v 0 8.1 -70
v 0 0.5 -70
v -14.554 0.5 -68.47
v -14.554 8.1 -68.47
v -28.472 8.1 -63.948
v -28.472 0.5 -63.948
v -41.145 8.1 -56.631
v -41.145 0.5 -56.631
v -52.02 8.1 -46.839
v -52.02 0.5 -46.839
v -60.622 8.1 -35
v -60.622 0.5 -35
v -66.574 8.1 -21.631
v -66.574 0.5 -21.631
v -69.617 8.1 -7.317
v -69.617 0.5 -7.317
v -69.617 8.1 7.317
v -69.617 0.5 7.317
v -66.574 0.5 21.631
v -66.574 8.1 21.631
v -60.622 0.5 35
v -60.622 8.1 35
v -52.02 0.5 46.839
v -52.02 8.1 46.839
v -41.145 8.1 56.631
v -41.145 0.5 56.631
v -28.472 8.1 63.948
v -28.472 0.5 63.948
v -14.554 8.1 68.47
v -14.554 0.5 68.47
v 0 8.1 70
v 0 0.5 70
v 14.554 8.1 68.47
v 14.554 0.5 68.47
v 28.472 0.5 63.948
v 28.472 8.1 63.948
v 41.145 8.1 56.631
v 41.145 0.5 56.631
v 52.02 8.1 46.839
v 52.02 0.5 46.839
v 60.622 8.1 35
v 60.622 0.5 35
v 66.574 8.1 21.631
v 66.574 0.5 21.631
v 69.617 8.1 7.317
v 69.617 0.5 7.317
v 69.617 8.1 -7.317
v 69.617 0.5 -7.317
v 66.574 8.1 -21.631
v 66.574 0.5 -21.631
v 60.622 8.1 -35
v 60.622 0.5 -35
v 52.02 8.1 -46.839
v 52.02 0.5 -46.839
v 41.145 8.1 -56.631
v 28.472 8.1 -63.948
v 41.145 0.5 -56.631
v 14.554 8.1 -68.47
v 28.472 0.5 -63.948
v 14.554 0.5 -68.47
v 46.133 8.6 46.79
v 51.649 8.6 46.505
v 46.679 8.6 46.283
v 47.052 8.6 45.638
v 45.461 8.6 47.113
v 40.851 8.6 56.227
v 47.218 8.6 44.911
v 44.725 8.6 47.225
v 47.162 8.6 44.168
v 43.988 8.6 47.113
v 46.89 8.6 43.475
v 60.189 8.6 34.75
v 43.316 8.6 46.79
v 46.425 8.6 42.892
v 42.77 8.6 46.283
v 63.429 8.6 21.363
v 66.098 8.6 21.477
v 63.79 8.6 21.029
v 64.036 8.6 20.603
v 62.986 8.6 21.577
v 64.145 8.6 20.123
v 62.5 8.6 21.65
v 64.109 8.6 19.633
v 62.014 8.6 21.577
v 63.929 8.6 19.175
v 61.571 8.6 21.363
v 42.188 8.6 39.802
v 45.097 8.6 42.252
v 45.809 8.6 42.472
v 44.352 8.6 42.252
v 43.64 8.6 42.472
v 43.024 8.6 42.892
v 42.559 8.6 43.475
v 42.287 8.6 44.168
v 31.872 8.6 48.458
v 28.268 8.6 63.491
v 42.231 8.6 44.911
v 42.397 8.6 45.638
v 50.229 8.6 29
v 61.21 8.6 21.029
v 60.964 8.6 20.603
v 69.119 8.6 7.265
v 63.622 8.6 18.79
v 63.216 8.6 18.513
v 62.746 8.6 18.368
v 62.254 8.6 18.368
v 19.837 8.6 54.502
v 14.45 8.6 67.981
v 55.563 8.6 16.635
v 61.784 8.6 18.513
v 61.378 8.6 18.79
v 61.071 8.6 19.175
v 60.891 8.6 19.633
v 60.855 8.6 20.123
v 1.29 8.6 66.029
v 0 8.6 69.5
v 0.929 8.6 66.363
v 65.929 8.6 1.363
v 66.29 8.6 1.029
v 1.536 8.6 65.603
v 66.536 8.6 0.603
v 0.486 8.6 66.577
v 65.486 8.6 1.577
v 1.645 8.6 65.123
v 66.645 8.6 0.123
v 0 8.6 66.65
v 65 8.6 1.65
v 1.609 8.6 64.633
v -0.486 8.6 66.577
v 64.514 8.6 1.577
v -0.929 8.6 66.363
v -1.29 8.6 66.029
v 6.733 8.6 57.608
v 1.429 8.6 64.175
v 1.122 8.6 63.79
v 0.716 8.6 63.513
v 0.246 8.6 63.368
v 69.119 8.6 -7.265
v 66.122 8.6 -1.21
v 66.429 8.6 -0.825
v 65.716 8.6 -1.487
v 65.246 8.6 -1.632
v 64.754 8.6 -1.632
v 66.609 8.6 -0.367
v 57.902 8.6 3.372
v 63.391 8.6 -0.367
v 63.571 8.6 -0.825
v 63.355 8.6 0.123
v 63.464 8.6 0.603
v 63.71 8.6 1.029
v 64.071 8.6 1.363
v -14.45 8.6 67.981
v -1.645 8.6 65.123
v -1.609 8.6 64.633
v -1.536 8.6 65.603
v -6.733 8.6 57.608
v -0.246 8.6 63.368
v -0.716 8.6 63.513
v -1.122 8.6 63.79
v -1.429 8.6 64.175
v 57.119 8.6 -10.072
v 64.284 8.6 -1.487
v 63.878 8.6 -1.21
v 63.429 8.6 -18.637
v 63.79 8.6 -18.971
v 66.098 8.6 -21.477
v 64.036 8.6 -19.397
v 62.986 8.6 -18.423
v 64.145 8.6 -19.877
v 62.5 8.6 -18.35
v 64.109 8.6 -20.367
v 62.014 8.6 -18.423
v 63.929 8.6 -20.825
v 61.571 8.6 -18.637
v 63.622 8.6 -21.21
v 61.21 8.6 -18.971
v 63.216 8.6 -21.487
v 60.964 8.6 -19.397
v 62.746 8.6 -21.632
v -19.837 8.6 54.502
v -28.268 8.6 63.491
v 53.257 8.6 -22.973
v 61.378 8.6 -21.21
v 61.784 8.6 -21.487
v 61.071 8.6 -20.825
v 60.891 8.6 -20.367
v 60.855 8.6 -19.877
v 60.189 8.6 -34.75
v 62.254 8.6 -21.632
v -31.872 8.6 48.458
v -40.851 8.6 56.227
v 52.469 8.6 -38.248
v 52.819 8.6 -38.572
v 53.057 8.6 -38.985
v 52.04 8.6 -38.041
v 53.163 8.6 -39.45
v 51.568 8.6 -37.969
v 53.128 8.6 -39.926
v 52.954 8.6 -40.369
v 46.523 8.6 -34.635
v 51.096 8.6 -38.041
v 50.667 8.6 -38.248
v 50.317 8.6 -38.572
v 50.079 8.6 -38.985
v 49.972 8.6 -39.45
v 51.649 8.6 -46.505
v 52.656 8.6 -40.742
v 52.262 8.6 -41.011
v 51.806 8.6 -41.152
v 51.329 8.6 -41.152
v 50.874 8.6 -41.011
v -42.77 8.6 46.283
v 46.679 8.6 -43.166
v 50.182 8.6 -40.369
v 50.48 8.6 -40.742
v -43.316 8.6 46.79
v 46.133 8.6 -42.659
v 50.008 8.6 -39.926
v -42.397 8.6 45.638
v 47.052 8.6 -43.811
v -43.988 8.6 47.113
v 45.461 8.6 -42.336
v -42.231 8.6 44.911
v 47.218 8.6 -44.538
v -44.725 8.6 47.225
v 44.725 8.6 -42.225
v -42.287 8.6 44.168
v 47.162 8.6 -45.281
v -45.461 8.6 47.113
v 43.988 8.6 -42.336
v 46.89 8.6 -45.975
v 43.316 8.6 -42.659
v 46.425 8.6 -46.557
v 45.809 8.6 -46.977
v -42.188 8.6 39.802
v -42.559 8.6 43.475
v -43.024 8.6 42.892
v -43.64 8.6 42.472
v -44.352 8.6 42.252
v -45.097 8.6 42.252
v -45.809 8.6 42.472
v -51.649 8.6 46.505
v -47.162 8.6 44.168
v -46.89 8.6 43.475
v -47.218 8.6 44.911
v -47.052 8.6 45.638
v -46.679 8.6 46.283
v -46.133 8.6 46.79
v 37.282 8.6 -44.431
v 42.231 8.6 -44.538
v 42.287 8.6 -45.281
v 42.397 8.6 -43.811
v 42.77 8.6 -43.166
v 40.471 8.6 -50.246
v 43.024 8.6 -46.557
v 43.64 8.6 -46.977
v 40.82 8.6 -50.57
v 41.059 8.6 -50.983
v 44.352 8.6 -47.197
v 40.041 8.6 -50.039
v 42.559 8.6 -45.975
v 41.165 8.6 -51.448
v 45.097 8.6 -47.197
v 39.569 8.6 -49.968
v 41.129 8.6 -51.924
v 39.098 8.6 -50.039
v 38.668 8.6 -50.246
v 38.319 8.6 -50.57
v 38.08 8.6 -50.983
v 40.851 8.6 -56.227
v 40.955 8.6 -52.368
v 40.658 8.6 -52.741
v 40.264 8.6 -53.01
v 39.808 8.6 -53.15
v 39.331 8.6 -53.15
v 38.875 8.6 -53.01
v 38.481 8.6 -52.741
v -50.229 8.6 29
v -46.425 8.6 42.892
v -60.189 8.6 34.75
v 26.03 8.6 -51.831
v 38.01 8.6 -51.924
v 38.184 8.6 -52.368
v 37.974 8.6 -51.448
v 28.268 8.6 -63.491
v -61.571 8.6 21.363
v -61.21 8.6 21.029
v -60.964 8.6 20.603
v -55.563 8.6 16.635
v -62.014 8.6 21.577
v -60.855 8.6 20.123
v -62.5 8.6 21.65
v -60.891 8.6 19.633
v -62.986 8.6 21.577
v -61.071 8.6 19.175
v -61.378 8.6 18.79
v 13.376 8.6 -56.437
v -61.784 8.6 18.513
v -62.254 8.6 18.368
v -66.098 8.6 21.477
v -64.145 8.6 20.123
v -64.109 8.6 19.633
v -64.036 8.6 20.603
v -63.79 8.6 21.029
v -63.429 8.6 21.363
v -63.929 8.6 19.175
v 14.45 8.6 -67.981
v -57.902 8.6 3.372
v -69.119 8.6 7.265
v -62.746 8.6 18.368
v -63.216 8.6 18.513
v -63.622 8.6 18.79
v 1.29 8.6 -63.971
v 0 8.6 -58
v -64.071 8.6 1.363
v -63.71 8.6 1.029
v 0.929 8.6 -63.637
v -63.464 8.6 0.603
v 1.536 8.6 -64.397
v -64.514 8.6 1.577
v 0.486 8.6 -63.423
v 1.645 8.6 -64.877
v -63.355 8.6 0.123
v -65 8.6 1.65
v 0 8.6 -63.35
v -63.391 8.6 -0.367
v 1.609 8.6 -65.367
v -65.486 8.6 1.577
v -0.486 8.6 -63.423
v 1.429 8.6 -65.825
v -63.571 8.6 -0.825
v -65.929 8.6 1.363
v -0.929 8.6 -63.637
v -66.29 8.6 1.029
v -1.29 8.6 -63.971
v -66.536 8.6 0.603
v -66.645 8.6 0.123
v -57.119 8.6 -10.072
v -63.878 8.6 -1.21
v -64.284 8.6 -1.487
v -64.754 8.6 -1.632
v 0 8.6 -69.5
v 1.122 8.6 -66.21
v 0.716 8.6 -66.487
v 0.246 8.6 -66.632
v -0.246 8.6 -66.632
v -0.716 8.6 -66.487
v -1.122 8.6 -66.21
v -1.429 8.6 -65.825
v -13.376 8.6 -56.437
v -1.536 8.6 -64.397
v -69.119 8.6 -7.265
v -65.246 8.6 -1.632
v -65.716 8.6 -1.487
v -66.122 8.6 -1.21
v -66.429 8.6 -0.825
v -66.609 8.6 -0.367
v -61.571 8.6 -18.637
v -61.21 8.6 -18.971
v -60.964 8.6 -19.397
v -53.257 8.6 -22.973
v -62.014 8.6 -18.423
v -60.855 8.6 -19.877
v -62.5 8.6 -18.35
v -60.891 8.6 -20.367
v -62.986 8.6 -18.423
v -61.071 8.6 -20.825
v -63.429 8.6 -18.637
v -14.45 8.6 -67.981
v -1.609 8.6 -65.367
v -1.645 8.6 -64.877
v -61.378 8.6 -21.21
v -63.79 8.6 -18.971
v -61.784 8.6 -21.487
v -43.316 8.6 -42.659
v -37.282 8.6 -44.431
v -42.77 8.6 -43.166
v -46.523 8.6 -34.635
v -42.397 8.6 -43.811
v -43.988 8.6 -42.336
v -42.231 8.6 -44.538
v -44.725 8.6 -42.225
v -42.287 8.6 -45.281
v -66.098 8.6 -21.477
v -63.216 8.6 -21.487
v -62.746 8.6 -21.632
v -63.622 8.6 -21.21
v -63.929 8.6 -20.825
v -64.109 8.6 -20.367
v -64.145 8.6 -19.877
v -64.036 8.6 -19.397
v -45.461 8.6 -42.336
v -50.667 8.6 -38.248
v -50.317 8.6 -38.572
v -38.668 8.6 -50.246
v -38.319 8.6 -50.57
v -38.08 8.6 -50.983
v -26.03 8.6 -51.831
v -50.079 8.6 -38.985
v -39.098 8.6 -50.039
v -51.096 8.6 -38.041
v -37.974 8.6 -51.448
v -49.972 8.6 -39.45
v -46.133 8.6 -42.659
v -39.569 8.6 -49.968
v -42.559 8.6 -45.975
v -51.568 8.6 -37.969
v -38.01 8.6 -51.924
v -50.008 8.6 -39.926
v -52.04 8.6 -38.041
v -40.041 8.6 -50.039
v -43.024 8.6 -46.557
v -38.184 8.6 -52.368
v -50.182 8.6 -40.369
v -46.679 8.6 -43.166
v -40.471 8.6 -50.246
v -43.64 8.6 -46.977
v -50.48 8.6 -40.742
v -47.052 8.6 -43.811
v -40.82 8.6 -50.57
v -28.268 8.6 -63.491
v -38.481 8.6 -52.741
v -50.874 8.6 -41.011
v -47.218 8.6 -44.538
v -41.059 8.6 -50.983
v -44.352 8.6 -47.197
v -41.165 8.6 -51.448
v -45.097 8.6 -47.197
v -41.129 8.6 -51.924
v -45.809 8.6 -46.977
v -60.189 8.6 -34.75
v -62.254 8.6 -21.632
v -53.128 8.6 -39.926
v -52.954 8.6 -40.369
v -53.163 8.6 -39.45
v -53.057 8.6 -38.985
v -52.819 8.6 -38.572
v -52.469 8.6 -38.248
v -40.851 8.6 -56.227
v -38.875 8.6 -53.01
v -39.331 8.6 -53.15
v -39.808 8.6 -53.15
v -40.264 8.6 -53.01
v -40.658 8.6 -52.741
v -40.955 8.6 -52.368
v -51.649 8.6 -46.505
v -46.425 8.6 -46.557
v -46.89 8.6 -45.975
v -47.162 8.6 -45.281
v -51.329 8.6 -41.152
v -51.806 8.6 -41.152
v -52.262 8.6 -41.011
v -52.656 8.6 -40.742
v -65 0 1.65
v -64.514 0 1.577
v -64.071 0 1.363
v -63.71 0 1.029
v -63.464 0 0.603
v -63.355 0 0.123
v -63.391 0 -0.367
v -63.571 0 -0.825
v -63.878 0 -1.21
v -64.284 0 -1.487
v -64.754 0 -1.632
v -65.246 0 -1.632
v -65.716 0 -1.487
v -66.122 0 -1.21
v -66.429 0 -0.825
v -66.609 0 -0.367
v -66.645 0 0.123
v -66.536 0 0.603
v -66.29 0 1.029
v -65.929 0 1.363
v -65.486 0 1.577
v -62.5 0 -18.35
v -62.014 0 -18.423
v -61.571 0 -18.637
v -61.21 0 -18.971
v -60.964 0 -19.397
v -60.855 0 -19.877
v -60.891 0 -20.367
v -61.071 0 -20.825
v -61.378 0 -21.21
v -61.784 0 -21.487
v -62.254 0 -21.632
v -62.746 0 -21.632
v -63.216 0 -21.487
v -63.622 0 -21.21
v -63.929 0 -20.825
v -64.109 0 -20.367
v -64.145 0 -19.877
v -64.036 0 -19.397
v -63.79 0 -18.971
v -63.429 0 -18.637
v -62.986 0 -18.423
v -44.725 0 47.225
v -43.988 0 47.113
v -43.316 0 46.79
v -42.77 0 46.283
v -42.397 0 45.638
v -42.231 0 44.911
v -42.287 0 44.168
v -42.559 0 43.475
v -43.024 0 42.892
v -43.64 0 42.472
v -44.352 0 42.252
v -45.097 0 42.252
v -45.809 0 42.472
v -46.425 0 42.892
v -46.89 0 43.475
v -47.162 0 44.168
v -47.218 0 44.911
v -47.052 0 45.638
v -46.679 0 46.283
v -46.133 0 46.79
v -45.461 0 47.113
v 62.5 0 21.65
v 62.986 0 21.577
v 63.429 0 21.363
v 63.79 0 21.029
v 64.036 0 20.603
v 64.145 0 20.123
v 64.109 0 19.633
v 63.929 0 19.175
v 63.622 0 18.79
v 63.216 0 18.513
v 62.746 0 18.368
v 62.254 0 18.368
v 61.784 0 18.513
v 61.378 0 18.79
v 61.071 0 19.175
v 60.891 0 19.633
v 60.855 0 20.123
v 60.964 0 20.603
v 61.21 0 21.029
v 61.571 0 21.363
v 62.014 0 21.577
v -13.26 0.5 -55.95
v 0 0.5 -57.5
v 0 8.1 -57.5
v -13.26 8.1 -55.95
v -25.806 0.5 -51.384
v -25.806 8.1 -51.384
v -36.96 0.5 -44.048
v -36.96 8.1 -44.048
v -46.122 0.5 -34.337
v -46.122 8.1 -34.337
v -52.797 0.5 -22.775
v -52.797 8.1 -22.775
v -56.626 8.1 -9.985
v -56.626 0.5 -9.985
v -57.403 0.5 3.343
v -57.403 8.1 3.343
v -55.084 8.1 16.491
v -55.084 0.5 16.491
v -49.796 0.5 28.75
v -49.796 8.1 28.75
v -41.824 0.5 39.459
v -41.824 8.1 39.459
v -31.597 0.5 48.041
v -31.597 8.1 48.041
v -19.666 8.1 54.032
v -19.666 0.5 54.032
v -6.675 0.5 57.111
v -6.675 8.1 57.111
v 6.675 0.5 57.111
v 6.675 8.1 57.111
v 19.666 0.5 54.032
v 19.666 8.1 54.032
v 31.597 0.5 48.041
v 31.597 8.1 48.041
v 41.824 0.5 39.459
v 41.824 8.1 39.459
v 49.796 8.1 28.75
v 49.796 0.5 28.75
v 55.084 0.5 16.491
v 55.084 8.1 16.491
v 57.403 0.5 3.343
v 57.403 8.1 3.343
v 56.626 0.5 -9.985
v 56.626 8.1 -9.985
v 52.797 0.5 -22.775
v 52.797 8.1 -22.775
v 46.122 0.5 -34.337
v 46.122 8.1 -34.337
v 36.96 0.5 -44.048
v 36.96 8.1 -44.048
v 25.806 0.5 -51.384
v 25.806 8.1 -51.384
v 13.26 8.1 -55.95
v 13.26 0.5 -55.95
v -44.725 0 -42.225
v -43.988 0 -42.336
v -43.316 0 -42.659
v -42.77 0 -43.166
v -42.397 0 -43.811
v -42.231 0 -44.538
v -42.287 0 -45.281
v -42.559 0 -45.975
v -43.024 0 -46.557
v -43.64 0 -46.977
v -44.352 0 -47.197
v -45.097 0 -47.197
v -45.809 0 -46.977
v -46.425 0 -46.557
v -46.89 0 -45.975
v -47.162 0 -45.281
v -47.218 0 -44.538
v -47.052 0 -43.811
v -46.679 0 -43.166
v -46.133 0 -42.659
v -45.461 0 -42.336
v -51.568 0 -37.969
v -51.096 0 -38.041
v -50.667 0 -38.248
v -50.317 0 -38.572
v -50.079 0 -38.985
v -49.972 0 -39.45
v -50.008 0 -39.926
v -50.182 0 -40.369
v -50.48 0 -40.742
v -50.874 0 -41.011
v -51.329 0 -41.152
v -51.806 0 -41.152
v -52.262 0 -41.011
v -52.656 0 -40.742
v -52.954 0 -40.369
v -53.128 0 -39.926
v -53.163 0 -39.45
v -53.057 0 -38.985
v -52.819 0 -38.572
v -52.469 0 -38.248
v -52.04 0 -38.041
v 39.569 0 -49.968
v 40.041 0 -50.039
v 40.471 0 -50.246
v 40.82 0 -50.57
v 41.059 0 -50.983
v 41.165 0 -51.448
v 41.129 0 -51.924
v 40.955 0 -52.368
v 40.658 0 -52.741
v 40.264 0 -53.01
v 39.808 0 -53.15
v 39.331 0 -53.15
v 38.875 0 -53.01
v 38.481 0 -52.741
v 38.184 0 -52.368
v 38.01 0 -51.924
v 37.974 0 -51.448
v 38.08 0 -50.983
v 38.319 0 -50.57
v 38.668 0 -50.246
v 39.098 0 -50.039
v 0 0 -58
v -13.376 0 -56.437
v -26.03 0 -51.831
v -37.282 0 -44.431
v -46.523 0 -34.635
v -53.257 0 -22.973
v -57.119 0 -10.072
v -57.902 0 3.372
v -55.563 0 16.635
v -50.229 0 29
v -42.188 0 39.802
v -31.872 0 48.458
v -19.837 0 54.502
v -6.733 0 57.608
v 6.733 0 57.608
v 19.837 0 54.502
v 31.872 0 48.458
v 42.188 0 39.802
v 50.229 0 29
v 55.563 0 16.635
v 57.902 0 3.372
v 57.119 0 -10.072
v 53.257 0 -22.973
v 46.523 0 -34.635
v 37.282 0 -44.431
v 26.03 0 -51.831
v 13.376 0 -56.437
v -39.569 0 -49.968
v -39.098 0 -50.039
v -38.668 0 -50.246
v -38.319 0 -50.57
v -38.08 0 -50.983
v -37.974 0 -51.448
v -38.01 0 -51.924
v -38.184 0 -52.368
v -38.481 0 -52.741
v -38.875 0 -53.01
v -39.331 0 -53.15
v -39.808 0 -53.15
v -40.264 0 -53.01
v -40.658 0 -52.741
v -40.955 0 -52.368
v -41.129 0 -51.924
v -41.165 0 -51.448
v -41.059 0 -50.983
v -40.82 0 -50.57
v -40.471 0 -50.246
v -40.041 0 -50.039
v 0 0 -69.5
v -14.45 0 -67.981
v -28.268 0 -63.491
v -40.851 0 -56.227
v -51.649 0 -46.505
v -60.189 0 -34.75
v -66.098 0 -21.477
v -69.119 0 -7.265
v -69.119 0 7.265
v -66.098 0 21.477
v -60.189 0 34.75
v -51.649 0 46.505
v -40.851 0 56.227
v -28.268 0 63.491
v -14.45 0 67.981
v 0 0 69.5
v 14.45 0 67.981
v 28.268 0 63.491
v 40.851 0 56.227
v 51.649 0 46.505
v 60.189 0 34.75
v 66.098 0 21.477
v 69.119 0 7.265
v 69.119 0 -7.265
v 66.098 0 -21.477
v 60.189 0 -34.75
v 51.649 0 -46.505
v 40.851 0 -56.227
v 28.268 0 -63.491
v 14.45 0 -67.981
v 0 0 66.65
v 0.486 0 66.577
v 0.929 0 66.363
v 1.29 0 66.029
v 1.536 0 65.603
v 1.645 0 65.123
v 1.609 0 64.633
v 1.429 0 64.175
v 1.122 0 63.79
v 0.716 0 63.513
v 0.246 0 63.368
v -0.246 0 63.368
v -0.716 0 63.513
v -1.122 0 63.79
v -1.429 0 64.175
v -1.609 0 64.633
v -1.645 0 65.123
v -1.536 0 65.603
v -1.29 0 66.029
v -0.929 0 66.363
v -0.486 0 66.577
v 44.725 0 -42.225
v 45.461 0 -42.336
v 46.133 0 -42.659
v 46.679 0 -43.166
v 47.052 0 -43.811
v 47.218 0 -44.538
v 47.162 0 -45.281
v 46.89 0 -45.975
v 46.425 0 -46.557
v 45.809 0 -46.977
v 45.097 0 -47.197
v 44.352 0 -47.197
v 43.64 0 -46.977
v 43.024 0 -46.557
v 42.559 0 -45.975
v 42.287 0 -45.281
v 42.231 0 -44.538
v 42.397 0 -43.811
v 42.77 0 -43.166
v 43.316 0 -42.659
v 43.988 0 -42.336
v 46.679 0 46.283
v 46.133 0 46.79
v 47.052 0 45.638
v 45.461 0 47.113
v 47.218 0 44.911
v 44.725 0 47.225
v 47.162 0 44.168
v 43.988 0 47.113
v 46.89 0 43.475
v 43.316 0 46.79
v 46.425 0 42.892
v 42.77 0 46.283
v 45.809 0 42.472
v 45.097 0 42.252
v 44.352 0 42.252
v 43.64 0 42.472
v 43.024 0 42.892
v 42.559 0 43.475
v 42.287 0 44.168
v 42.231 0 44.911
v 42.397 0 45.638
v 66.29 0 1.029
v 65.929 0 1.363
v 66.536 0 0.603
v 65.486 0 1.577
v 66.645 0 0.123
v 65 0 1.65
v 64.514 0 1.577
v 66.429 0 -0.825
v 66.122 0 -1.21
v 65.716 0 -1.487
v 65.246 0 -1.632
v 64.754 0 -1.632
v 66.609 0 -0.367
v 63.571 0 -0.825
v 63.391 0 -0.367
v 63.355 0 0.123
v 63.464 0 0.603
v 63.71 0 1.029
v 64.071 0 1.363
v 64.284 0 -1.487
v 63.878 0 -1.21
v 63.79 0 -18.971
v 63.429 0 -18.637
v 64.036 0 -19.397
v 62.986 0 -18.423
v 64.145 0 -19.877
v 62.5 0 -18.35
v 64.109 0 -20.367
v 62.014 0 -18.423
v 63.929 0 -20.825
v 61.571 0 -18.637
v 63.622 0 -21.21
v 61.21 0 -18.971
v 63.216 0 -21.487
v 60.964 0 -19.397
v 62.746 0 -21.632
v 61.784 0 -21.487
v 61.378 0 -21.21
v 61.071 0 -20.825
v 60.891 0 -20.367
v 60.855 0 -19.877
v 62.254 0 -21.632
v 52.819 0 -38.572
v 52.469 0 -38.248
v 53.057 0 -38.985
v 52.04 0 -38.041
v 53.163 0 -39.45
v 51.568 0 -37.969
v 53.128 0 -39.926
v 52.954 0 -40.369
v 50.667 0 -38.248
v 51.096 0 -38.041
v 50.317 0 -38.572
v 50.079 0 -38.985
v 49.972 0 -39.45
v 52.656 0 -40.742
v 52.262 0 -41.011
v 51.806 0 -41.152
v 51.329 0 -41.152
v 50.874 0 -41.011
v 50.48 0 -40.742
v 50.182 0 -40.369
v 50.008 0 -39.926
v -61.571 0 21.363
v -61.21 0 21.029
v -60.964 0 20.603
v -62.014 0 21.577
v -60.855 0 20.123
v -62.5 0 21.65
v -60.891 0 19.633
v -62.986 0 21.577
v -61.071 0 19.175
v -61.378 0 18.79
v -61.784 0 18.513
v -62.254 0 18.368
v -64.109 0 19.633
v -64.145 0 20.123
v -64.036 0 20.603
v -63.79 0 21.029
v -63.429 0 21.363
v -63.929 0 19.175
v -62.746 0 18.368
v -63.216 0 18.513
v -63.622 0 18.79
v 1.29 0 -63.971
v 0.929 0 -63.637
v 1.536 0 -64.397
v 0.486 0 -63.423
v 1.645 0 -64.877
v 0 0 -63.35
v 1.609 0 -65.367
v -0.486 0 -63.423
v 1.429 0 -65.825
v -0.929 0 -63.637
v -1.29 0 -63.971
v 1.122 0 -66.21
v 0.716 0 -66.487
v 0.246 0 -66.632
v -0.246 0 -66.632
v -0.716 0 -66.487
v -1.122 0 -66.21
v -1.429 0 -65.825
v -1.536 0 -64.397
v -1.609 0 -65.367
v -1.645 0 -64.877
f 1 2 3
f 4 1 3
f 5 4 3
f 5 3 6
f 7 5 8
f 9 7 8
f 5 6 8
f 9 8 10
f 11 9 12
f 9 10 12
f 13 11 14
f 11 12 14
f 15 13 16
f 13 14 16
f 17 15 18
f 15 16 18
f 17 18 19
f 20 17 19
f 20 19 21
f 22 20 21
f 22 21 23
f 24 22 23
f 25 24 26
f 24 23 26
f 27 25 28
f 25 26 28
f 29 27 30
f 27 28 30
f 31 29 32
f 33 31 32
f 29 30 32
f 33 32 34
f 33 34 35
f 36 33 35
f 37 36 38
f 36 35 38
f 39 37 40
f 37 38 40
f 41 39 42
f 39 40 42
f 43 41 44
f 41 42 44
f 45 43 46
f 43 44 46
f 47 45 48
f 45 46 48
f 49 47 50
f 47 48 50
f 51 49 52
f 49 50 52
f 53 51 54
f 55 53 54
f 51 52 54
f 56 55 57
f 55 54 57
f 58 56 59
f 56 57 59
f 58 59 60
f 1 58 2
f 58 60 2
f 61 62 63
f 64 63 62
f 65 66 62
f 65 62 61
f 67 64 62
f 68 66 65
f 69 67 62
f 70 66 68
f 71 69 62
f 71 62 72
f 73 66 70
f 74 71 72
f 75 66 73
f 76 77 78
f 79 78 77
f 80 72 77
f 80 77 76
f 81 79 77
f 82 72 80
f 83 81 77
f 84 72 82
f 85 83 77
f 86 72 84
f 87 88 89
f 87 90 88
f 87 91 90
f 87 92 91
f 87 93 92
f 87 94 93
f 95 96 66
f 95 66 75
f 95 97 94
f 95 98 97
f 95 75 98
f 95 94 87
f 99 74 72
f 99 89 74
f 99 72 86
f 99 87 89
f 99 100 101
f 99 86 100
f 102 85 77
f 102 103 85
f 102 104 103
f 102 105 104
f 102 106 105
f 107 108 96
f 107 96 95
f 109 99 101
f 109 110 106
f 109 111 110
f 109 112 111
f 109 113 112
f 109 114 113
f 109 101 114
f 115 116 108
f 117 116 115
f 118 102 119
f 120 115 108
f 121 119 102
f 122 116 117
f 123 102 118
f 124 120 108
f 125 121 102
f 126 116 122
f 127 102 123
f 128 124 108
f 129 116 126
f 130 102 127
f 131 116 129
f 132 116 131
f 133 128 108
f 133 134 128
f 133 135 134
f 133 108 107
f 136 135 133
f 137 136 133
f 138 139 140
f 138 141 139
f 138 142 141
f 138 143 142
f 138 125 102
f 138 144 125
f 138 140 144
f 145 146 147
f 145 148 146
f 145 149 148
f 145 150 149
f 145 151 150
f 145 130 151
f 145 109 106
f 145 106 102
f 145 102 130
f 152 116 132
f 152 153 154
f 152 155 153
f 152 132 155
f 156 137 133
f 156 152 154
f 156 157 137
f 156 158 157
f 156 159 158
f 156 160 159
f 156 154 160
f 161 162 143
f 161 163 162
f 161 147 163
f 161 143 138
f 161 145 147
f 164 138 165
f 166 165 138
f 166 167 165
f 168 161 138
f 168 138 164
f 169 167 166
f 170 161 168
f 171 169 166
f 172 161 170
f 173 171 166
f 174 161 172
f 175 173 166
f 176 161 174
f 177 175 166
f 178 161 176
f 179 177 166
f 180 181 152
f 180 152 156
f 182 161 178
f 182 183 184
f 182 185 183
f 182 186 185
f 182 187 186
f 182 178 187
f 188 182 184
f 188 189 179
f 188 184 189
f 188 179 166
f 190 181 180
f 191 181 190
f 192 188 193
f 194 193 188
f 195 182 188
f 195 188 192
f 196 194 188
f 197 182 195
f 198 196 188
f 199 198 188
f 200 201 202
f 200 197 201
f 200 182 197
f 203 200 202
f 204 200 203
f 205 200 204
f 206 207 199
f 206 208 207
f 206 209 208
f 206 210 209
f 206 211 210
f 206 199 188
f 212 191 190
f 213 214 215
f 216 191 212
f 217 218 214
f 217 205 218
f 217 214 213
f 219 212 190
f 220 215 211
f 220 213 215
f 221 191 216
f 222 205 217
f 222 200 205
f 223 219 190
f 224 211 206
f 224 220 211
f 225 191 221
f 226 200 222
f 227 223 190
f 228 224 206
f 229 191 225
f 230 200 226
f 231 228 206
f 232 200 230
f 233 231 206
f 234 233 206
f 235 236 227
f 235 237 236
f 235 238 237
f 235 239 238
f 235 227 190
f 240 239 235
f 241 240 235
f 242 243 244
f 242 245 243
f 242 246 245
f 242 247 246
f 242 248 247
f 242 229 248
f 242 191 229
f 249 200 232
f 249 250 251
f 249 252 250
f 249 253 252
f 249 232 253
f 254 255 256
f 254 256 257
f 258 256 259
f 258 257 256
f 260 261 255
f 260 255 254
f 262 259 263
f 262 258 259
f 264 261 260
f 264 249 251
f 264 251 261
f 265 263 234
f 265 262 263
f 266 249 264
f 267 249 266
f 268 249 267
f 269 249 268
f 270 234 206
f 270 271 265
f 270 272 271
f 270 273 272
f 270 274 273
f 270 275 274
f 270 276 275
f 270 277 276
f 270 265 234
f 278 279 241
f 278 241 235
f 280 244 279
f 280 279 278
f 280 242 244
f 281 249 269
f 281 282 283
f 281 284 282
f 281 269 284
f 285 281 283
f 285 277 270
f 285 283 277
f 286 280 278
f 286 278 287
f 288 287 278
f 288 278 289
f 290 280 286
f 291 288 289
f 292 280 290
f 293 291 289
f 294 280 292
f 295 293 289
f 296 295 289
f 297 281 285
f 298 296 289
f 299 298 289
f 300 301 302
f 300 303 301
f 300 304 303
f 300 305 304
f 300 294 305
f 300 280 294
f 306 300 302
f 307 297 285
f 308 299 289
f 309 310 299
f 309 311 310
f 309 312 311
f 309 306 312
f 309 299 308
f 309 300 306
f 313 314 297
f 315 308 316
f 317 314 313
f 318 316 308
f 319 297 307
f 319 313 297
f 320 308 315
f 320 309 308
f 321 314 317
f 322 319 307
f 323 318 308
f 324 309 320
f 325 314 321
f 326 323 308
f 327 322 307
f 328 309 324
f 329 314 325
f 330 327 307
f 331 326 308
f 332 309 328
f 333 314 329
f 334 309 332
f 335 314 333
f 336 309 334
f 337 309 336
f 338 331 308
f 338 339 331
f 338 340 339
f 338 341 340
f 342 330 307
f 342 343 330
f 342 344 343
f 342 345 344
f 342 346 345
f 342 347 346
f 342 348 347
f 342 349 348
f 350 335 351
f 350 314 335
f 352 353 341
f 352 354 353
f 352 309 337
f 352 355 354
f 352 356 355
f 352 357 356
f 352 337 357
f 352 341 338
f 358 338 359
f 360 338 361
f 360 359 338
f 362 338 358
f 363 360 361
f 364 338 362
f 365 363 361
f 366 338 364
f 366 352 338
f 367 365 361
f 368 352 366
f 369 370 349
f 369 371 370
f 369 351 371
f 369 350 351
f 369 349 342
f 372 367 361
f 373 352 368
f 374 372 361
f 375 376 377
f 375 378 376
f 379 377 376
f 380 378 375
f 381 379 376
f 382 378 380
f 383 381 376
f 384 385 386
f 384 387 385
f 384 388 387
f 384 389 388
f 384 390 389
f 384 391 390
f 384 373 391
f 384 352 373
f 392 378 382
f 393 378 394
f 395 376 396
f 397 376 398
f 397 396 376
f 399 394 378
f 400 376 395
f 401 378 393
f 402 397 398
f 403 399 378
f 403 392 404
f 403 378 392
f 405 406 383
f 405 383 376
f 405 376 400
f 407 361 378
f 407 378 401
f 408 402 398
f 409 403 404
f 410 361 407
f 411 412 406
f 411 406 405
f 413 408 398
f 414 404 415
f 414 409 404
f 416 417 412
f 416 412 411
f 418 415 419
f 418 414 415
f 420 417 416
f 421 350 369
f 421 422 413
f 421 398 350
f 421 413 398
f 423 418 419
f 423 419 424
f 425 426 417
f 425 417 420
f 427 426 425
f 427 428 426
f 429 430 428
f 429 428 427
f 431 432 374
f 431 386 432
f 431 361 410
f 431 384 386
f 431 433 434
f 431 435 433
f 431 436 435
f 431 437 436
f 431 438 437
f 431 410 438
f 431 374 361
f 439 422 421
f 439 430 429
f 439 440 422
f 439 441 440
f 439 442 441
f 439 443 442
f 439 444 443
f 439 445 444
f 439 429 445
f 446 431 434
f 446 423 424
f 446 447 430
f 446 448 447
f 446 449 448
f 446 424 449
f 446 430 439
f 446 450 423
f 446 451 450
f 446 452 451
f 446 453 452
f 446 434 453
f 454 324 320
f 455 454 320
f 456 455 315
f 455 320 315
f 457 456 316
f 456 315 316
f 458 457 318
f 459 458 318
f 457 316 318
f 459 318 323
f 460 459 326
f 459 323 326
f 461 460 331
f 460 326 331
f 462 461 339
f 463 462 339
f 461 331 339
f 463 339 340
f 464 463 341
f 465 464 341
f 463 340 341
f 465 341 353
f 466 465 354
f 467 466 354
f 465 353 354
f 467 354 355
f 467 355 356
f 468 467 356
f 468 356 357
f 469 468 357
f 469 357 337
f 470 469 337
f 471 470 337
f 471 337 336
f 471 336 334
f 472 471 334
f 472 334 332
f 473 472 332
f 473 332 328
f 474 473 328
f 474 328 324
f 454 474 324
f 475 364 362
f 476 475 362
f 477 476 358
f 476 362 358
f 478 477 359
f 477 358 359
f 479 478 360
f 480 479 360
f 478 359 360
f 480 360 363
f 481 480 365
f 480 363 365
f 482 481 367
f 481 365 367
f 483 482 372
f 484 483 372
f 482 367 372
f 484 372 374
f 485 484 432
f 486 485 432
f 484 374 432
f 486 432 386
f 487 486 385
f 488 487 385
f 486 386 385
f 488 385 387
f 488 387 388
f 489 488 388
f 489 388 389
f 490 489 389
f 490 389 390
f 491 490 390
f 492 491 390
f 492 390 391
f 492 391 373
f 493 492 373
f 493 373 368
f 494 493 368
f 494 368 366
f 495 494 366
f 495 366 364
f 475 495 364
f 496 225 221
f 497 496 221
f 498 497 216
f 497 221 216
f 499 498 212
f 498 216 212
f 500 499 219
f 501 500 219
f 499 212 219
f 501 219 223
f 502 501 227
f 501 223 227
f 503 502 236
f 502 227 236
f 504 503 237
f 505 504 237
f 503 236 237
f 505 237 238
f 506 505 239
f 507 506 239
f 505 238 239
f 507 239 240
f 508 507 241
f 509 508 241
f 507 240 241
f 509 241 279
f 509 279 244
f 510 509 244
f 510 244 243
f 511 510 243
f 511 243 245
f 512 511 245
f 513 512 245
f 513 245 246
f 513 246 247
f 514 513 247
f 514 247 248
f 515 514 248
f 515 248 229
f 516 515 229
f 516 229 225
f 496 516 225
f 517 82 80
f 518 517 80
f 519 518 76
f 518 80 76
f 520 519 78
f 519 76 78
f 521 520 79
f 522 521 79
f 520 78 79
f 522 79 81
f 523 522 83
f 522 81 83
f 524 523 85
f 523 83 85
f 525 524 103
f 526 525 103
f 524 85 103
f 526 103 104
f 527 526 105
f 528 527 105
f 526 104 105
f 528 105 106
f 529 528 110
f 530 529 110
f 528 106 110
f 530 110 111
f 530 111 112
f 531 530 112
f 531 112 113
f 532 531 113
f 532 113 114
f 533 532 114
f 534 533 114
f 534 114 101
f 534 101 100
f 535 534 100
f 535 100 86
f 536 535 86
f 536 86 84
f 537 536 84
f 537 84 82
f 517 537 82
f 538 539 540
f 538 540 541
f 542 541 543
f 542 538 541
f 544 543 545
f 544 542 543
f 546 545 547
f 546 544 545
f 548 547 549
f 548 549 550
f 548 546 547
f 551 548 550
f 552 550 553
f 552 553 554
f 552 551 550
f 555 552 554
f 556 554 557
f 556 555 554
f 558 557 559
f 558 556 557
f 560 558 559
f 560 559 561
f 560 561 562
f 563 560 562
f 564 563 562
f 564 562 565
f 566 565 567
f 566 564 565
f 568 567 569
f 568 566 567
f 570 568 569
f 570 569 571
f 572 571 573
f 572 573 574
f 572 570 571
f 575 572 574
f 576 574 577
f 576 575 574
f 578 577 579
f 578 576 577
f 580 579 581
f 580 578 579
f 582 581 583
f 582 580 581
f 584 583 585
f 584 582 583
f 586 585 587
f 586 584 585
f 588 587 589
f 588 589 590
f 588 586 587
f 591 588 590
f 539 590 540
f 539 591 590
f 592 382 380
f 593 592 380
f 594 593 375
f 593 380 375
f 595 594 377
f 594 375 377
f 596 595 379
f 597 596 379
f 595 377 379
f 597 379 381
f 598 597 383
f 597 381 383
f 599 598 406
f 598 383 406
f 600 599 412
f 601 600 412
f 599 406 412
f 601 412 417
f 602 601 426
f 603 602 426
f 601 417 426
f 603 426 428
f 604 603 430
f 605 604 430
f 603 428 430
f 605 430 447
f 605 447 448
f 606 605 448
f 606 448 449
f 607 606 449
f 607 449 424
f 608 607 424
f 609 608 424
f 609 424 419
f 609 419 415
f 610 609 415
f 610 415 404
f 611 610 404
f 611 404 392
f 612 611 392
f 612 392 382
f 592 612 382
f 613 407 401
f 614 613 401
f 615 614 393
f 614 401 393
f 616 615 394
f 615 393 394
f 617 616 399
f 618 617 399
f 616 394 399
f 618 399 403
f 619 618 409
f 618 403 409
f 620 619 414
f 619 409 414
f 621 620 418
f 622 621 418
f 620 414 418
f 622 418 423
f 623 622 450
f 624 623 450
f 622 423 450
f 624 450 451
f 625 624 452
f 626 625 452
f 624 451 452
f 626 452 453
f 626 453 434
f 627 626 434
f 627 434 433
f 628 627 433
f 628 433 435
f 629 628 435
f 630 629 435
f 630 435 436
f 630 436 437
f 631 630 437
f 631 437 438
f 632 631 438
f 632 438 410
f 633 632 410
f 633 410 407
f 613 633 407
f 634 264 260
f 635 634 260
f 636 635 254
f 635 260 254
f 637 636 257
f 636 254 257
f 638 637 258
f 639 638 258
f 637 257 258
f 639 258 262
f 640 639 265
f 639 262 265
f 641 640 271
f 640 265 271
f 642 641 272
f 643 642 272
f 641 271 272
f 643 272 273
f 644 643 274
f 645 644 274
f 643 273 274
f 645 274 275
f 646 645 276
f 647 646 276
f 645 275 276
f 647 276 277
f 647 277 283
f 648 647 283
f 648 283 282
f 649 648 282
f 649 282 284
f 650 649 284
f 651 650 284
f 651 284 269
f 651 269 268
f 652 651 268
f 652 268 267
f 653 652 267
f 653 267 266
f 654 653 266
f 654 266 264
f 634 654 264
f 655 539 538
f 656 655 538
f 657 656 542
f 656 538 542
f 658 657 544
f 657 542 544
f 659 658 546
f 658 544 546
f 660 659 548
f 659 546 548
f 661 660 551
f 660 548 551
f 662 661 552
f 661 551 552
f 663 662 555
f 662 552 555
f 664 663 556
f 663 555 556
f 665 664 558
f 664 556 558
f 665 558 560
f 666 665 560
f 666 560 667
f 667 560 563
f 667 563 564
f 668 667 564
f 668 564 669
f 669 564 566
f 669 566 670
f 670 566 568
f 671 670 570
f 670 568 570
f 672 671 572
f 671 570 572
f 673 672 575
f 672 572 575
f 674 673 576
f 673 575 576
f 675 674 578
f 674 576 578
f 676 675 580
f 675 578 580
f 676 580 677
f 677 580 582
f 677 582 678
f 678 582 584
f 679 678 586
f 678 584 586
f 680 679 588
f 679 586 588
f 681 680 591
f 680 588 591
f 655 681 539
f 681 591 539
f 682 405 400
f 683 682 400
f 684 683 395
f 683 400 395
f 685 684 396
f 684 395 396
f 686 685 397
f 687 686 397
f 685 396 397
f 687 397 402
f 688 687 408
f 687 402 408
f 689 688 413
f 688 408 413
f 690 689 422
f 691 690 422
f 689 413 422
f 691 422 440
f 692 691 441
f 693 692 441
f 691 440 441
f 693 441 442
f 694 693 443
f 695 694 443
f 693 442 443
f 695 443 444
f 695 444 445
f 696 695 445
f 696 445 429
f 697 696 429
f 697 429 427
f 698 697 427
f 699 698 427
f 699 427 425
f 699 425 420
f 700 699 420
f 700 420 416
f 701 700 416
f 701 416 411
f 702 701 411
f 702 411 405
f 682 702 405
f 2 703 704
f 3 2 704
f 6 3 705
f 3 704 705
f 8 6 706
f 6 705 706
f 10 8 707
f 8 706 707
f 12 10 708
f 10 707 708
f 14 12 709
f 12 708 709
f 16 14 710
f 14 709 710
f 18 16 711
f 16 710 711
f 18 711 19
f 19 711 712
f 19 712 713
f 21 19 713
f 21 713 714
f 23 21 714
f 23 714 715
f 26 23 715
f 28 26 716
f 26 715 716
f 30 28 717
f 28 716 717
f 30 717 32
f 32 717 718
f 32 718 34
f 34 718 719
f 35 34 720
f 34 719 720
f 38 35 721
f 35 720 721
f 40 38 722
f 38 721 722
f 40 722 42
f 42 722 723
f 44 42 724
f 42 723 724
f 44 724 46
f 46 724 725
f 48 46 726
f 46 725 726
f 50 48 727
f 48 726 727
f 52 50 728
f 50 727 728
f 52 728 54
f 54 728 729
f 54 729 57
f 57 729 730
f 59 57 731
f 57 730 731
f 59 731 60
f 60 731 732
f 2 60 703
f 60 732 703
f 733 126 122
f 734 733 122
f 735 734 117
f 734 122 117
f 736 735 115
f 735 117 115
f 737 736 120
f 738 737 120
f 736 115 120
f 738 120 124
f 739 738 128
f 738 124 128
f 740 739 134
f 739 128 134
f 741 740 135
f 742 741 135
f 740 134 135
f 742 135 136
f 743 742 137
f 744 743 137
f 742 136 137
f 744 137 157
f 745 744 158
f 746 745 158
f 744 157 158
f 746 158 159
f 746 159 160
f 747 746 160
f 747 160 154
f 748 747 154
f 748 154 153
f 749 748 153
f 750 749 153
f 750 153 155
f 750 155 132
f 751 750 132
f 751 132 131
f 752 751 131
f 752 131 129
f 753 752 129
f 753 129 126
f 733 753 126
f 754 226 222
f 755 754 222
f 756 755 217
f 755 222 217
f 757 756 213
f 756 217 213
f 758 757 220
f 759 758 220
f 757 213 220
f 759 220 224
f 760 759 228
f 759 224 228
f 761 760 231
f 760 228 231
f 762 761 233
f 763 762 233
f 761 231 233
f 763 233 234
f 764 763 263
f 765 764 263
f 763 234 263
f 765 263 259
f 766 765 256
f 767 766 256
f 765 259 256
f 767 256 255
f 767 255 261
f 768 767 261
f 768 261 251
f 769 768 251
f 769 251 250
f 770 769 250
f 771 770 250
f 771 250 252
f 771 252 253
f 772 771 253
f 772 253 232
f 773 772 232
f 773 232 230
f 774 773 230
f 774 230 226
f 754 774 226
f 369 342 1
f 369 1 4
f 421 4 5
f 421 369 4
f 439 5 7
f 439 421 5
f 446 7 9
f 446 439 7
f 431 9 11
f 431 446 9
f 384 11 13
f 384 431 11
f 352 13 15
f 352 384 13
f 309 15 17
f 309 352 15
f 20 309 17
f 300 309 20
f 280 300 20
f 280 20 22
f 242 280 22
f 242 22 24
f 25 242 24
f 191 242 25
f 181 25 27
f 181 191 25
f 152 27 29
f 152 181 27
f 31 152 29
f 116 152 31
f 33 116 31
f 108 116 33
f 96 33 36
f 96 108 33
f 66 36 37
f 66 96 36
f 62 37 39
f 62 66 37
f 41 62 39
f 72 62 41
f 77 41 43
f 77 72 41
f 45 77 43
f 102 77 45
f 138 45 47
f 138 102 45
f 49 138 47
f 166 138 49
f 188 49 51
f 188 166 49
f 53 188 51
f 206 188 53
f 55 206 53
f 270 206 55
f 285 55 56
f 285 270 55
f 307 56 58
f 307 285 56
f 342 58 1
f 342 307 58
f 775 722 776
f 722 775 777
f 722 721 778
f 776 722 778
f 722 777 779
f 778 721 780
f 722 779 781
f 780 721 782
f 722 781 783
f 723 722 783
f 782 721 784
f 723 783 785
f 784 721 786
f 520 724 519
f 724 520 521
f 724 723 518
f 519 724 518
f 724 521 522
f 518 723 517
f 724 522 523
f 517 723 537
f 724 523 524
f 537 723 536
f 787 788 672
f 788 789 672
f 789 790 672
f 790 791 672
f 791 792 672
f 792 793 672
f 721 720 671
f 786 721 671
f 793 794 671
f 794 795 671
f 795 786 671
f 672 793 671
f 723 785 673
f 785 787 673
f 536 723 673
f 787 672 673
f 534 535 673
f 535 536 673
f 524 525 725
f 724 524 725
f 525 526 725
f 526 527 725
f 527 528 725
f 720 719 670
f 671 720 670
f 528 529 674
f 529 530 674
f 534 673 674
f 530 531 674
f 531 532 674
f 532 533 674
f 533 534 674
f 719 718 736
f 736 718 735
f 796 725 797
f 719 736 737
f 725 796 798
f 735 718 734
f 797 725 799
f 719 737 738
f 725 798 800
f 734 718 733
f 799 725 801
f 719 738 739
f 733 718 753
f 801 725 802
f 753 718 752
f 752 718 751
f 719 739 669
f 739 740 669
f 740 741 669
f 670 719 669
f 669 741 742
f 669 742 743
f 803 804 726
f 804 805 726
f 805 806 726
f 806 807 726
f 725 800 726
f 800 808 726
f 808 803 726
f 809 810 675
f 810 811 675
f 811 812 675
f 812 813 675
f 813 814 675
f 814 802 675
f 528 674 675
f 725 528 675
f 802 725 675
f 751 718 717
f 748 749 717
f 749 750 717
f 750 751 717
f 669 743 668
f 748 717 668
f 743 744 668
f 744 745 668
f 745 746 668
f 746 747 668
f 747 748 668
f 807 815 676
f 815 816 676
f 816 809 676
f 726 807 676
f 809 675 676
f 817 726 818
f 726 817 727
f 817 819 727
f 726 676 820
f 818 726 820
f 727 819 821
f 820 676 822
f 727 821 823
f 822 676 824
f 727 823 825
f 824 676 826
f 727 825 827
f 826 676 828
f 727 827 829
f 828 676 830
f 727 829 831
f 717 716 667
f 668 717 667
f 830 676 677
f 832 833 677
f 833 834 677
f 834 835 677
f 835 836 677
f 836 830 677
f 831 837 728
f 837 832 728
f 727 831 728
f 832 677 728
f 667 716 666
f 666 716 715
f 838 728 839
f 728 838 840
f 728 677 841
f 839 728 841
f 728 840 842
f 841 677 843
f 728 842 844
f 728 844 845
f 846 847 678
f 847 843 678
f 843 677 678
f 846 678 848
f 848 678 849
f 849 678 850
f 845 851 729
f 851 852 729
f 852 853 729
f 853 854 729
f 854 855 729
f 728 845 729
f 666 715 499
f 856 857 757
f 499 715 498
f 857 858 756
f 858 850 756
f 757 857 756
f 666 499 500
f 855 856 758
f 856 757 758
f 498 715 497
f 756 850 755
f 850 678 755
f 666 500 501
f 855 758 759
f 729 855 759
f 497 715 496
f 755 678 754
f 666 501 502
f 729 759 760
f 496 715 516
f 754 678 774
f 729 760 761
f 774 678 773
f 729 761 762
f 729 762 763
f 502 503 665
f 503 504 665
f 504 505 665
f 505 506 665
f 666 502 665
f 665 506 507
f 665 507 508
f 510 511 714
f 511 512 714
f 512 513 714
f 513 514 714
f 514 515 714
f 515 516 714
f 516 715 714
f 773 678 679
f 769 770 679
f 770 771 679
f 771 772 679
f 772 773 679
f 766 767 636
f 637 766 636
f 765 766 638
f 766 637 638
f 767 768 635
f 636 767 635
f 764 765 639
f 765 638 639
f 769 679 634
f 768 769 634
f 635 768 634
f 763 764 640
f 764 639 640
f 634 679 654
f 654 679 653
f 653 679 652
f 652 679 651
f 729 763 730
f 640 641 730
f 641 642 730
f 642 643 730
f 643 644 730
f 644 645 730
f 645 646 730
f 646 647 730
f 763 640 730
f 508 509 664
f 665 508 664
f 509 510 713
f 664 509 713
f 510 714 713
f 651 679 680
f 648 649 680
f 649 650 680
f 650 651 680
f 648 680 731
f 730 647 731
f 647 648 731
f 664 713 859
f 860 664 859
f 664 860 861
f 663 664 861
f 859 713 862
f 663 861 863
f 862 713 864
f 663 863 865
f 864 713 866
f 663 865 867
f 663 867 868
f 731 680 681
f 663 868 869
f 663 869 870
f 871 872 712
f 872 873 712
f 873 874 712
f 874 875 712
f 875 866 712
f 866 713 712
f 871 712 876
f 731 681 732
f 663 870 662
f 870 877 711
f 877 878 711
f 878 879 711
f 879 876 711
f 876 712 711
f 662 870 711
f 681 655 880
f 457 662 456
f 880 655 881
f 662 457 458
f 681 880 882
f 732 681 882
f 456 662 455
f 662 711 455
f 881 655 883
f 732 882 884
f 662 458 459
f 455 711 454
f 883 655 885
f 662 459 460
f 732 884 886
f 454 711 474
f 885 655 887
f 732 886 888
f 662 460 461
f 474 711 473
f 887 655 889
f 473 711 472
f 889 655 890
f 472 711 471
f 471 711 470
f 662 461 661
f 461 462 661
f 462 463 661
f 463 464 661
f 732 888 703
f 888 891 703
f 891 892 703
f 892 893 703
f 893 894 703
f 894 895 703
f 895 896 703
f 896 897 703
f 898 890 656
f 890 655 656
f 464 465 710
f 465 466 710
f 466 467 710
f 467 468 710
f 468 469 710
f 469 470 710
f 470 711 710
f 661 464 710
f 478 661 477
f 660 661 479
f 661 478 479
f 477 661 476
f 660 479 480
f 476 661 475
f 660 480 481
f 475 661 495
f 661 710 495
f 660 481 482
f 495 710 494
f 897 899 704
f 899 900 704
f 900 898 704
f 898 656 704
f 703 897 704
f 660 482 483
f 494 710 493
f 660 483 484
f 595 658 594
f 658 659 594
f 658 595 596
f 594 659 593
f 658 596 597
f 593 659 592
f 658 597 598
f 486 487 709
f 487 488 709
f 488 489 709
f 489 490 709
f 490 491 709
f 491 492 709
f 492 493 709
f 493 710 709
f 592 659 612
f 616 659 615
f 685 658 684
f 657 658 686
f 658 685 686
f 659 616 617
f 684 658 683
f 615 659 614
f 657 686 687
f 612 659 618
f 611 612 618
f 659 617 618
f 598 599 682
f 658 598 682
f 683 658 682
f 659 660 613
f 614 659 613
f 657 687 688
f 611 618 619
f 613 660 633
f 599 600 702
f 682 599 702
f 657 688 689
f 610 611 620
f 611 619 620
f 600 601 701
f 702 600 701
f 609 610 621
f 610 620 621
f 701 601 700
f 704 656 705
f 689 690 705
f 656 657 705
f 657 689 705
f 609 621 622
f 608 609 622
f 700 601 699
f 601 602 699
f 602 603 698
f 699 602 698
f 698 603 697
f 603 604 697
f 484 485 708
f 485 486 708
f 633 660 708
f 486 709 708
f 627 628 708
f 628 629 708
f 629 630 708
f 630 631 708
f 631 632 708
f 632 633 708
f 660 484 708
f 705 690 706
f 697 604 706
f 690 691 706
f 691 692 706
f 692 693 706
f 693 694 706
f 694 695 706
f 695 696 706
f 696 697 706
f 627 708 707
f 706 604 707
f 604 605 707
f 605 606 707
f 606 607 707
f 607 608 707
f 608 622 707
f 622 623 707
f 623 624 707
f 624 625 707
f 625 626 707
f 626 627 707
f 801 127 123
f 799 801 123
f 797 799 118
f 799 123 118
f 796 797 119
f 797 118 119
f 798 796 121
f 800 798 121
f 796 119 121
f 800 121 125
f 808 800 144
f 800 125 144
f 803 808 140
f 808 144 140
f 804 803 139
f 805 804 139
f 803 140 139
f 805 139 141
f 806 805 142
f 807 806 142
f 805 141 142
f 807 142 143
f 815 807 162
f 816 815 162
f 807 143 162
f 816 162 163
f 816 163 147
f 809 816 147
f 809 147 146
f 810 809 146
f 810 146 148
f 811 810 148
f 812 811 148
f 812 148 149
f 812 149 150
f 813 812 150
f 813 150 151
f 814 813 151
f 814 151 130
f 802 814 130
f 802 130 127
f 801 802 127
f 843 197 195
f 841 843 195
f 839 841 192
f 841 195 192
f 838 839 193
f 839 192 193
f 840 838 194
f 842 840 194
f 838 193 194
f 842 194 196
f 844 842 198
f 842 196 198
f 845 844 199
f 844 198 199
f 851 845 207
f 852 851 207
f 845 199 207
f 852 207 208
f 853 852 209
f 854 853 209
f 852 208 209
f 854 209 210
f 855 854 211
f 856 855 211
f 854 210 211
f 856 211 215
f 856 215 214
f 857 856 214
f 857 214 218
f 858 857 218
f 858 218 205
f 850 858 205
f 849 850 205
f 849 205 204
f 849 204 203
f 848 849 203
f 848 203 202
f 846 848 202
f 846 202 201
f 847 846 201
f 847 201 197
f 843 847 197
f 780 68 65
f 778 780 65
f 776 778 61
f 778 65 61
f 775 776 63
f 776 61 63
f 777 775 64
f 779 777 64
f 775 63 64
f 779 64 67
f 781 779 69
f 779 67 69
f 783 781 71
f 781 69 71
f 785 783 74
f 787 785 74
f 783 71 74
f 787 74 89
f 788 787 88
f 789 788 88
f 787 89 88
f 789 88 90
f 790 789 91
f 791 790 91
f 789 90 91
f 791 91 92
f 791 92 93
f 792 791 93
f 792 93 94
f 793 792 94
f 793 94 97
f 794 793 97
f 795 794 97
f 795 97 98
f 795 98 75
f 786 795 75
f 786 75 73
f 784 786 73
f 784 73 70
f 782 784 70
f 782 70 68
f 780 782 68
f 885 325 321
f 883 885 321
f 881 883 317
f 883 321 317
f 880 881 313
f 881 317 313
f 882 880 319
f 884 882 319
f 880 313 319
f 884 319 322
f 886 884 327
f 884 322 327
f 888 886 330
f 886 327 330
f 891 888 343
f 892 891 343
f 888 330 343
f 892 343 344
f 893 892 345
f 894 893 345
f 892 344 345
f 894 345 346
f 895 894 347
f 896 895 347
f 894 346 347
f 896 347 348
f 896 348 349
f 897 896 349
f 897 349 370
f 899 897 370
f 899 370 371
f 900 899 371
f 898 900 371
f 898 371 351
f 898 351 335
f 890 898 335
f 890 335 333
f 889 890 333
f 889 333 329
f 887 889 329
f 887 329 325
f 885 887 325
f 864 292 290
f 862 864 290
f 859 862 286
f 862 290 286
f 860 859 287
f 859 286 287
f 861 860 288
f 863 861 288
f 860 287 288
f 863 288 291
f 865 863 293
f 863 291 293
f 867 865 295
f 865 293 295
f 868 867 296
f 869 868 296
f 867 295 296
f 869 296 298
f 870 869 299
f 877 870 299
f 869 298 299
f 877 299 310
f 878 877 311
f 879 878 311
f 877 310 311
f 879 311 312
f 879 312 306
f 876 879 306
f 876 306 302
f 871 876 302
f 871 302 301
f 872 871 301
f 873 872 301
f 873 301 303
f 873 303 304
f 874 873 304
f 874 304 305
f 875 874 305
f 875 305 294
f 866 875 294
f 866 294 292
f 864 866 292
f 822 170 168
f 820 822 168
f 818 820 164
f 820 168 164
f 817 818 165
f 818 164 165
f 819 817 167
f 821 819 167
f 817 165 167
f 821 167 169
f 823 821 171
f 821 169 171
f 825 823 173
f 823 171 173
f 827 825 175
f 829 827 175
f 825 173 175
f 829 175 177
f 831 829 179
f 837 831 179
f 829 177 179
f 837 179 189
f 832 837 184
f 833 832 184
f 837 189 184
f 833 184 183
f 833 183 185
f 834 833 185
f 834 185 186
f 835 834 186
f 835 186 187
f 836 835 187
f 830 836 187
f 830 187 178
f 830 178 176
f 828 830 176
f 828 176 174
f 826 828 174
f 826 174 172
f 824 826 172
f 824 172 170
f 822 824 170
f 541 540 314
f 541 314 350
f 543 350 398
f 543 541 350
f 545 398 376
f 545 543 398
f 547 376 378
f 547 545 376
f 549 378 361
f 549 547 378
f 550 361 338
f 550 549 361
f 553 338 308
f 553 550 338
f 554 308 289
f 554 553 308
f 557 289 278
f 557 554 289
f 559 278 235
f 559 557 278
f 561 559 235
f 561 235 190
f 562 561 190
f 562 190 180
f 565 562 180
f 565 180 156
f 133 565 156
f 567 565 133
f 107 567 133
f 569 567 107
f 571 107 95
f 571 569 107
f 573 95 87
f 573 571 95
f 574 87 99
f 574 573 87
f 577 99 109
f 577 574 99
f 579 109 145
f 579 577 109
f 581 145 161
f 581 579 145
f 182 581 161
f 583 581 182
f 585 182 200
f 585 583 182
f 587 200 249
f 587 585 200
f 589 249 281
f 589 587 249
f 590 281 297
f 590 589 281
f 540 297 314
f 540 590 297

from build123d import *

# Parameters (mm, degrees)
SKETCH_1_R          = 70
SKETCH_1_R_2        = 57.5
EXTRUDE_1_DEPTH     = 8.6
SKETCH_2_R          = 2.5
CUT_EXTRUDE_1_DEPTH = 100.367801626
CHAMFER_1_SIZE      = 0.5
SKETCH_3_R          = 1.65
CUT_EXTRUDE_2_DEPTH = 100.367801626
SKETCH_4_R          = 1.6
CUT_EXTRUDE_3_DEPTH = 100.367801626


with BuildPart() as part:
    # ｽｹｯﾁ1 → ﾎﾞｽ - 押し出し1 (new body)
    with BuildSketch(Plane(origin=(0, 0, 0), x_dir=(1, 0, 0), z_dir=(0, 1, 0))):
        with Locations(Location((0, 0, 0), (0, 0, 90))):
            Circle(SKETCH_1_R)
        with Locations(Location((0, 0, 0), (0, 0, 90))):
            Circle(SKETCH_1_R_2, mode=Mode.SUBTRACT)
    extrude(amount=EXTRUDE_1_DEPTH)

    # ｽｹｯﾁ2 → ｶｯﾄ - 押し出し1 (cut, through all)
    with BuildSketch(Plane(origin=(0, 8.6, 0), x_dir=(1, 0, 0), z_dir=(0, 1, 0))):
        with Locations(Location((-44.72450391, 44.72450391, 0), (0, 0, 270))):
            Circle(SKETCH_2_R)
        with Locations(Location((44.72450391, 44.72450391, 0), (0, 0, 270))):
            Circle(SKETCH_2_R)
        with Locations(Location((44.72450391, -44.72450391, 0), (0, 0, 270))):
            Circle(SKETCH_2_R)
        with Locations(Location((-44.72450391, -44.72450391, 0), (0, 0, 270))):
            Circle(SKETCH_2_R)
    extrude(amount=-CUT_EXTRUDE_1_DEPTH, mode=Mode.SUBTRACT)

    # 面取り1
    chamfer_1_edges = [part.edges().sort_by_distance(p)[0] for p in [
        (0, 0, 70),
        (0, 8.6, 70),
        (0, 0, 57.5),
        (0, 8.6, 57.5),
    ]]
    chamfer(chamfer_1_edges, length=CHAMFER_1_SIZE)

    # ｽｹｯﾁ3 → ｶｯﾄ - 押し出し2 (cut, through all)
    with BuildSketch(Plane(origin=(0, 8.6, 0), x_dir=(1, 0, 0), z_dir=(0, 1, 0))):
        with Locations(Location((65, 0, 0), (0, 0, 270))):
            Circle(SKETCH_3_R)
        with Locations(Location((0, -65, 0), (0, 0, 270))):
            Circle(SKETCH_3_R)
        with Locations(Location((-65, 0, 0), (0, 0, 270))):
            Circle(SKETCH_3_R)
        with Locations(Location((0, 65, 0), (0, 0, 270))):
            Circle(SKETCH_3_R)
        with Locations(Location((-62.5, 20, 0), (0, 0, 270))):
            Circle(SKETCH_3_R)
        with Locations(Location((62.5, 20, 0), (0, 0, 270))):
            Circle(SKETCH_3_R)
        with Locations(Location((62.5, -20, 0), (0, 0, 270))):
            Circle(SKETCH_3_R)
        with Locations(Location((-62.5, -20, 0), (0, 0, 270))):
            Circle(SKETCH_3_R)
    extrude(amount=-CUT_EXTRUDE_2_DEPTH, mode=Mode.SUBTRACT)

    # ｽｹｯﾁ4 → ｶｯﾄ - 押し出し3 (cut, through all)
    with BuildSketch(Plane(origin=(0, 8.6, 0), x_dir=(1, 0, 0), z_dir=(0, 1, 0))):
        with Locations(Location((51.567967119, 39.569492886, 0), (0, 0, 270))):
            Circle(SKETCH_4_R)
        with Locations(Location((39.569492886, 51.567967119, 0), (0, 0, 270))):
            Circle(SKETCH_4_R)
        with Locations(Location((-39.569492886, 51.567967119, 0), (0, 0, 270))):
            Circle(SKETCH_4_R)
        with Locations(Location((-51.567967119, 39.569492886, 0), (0, 0, 270))):
            Circle(SKETCH_4_R)
    extrude(amount=-CUT_EXTRUDE_3_DEPTH, mode=Mode.SUBTRACT)


solid = part.part
